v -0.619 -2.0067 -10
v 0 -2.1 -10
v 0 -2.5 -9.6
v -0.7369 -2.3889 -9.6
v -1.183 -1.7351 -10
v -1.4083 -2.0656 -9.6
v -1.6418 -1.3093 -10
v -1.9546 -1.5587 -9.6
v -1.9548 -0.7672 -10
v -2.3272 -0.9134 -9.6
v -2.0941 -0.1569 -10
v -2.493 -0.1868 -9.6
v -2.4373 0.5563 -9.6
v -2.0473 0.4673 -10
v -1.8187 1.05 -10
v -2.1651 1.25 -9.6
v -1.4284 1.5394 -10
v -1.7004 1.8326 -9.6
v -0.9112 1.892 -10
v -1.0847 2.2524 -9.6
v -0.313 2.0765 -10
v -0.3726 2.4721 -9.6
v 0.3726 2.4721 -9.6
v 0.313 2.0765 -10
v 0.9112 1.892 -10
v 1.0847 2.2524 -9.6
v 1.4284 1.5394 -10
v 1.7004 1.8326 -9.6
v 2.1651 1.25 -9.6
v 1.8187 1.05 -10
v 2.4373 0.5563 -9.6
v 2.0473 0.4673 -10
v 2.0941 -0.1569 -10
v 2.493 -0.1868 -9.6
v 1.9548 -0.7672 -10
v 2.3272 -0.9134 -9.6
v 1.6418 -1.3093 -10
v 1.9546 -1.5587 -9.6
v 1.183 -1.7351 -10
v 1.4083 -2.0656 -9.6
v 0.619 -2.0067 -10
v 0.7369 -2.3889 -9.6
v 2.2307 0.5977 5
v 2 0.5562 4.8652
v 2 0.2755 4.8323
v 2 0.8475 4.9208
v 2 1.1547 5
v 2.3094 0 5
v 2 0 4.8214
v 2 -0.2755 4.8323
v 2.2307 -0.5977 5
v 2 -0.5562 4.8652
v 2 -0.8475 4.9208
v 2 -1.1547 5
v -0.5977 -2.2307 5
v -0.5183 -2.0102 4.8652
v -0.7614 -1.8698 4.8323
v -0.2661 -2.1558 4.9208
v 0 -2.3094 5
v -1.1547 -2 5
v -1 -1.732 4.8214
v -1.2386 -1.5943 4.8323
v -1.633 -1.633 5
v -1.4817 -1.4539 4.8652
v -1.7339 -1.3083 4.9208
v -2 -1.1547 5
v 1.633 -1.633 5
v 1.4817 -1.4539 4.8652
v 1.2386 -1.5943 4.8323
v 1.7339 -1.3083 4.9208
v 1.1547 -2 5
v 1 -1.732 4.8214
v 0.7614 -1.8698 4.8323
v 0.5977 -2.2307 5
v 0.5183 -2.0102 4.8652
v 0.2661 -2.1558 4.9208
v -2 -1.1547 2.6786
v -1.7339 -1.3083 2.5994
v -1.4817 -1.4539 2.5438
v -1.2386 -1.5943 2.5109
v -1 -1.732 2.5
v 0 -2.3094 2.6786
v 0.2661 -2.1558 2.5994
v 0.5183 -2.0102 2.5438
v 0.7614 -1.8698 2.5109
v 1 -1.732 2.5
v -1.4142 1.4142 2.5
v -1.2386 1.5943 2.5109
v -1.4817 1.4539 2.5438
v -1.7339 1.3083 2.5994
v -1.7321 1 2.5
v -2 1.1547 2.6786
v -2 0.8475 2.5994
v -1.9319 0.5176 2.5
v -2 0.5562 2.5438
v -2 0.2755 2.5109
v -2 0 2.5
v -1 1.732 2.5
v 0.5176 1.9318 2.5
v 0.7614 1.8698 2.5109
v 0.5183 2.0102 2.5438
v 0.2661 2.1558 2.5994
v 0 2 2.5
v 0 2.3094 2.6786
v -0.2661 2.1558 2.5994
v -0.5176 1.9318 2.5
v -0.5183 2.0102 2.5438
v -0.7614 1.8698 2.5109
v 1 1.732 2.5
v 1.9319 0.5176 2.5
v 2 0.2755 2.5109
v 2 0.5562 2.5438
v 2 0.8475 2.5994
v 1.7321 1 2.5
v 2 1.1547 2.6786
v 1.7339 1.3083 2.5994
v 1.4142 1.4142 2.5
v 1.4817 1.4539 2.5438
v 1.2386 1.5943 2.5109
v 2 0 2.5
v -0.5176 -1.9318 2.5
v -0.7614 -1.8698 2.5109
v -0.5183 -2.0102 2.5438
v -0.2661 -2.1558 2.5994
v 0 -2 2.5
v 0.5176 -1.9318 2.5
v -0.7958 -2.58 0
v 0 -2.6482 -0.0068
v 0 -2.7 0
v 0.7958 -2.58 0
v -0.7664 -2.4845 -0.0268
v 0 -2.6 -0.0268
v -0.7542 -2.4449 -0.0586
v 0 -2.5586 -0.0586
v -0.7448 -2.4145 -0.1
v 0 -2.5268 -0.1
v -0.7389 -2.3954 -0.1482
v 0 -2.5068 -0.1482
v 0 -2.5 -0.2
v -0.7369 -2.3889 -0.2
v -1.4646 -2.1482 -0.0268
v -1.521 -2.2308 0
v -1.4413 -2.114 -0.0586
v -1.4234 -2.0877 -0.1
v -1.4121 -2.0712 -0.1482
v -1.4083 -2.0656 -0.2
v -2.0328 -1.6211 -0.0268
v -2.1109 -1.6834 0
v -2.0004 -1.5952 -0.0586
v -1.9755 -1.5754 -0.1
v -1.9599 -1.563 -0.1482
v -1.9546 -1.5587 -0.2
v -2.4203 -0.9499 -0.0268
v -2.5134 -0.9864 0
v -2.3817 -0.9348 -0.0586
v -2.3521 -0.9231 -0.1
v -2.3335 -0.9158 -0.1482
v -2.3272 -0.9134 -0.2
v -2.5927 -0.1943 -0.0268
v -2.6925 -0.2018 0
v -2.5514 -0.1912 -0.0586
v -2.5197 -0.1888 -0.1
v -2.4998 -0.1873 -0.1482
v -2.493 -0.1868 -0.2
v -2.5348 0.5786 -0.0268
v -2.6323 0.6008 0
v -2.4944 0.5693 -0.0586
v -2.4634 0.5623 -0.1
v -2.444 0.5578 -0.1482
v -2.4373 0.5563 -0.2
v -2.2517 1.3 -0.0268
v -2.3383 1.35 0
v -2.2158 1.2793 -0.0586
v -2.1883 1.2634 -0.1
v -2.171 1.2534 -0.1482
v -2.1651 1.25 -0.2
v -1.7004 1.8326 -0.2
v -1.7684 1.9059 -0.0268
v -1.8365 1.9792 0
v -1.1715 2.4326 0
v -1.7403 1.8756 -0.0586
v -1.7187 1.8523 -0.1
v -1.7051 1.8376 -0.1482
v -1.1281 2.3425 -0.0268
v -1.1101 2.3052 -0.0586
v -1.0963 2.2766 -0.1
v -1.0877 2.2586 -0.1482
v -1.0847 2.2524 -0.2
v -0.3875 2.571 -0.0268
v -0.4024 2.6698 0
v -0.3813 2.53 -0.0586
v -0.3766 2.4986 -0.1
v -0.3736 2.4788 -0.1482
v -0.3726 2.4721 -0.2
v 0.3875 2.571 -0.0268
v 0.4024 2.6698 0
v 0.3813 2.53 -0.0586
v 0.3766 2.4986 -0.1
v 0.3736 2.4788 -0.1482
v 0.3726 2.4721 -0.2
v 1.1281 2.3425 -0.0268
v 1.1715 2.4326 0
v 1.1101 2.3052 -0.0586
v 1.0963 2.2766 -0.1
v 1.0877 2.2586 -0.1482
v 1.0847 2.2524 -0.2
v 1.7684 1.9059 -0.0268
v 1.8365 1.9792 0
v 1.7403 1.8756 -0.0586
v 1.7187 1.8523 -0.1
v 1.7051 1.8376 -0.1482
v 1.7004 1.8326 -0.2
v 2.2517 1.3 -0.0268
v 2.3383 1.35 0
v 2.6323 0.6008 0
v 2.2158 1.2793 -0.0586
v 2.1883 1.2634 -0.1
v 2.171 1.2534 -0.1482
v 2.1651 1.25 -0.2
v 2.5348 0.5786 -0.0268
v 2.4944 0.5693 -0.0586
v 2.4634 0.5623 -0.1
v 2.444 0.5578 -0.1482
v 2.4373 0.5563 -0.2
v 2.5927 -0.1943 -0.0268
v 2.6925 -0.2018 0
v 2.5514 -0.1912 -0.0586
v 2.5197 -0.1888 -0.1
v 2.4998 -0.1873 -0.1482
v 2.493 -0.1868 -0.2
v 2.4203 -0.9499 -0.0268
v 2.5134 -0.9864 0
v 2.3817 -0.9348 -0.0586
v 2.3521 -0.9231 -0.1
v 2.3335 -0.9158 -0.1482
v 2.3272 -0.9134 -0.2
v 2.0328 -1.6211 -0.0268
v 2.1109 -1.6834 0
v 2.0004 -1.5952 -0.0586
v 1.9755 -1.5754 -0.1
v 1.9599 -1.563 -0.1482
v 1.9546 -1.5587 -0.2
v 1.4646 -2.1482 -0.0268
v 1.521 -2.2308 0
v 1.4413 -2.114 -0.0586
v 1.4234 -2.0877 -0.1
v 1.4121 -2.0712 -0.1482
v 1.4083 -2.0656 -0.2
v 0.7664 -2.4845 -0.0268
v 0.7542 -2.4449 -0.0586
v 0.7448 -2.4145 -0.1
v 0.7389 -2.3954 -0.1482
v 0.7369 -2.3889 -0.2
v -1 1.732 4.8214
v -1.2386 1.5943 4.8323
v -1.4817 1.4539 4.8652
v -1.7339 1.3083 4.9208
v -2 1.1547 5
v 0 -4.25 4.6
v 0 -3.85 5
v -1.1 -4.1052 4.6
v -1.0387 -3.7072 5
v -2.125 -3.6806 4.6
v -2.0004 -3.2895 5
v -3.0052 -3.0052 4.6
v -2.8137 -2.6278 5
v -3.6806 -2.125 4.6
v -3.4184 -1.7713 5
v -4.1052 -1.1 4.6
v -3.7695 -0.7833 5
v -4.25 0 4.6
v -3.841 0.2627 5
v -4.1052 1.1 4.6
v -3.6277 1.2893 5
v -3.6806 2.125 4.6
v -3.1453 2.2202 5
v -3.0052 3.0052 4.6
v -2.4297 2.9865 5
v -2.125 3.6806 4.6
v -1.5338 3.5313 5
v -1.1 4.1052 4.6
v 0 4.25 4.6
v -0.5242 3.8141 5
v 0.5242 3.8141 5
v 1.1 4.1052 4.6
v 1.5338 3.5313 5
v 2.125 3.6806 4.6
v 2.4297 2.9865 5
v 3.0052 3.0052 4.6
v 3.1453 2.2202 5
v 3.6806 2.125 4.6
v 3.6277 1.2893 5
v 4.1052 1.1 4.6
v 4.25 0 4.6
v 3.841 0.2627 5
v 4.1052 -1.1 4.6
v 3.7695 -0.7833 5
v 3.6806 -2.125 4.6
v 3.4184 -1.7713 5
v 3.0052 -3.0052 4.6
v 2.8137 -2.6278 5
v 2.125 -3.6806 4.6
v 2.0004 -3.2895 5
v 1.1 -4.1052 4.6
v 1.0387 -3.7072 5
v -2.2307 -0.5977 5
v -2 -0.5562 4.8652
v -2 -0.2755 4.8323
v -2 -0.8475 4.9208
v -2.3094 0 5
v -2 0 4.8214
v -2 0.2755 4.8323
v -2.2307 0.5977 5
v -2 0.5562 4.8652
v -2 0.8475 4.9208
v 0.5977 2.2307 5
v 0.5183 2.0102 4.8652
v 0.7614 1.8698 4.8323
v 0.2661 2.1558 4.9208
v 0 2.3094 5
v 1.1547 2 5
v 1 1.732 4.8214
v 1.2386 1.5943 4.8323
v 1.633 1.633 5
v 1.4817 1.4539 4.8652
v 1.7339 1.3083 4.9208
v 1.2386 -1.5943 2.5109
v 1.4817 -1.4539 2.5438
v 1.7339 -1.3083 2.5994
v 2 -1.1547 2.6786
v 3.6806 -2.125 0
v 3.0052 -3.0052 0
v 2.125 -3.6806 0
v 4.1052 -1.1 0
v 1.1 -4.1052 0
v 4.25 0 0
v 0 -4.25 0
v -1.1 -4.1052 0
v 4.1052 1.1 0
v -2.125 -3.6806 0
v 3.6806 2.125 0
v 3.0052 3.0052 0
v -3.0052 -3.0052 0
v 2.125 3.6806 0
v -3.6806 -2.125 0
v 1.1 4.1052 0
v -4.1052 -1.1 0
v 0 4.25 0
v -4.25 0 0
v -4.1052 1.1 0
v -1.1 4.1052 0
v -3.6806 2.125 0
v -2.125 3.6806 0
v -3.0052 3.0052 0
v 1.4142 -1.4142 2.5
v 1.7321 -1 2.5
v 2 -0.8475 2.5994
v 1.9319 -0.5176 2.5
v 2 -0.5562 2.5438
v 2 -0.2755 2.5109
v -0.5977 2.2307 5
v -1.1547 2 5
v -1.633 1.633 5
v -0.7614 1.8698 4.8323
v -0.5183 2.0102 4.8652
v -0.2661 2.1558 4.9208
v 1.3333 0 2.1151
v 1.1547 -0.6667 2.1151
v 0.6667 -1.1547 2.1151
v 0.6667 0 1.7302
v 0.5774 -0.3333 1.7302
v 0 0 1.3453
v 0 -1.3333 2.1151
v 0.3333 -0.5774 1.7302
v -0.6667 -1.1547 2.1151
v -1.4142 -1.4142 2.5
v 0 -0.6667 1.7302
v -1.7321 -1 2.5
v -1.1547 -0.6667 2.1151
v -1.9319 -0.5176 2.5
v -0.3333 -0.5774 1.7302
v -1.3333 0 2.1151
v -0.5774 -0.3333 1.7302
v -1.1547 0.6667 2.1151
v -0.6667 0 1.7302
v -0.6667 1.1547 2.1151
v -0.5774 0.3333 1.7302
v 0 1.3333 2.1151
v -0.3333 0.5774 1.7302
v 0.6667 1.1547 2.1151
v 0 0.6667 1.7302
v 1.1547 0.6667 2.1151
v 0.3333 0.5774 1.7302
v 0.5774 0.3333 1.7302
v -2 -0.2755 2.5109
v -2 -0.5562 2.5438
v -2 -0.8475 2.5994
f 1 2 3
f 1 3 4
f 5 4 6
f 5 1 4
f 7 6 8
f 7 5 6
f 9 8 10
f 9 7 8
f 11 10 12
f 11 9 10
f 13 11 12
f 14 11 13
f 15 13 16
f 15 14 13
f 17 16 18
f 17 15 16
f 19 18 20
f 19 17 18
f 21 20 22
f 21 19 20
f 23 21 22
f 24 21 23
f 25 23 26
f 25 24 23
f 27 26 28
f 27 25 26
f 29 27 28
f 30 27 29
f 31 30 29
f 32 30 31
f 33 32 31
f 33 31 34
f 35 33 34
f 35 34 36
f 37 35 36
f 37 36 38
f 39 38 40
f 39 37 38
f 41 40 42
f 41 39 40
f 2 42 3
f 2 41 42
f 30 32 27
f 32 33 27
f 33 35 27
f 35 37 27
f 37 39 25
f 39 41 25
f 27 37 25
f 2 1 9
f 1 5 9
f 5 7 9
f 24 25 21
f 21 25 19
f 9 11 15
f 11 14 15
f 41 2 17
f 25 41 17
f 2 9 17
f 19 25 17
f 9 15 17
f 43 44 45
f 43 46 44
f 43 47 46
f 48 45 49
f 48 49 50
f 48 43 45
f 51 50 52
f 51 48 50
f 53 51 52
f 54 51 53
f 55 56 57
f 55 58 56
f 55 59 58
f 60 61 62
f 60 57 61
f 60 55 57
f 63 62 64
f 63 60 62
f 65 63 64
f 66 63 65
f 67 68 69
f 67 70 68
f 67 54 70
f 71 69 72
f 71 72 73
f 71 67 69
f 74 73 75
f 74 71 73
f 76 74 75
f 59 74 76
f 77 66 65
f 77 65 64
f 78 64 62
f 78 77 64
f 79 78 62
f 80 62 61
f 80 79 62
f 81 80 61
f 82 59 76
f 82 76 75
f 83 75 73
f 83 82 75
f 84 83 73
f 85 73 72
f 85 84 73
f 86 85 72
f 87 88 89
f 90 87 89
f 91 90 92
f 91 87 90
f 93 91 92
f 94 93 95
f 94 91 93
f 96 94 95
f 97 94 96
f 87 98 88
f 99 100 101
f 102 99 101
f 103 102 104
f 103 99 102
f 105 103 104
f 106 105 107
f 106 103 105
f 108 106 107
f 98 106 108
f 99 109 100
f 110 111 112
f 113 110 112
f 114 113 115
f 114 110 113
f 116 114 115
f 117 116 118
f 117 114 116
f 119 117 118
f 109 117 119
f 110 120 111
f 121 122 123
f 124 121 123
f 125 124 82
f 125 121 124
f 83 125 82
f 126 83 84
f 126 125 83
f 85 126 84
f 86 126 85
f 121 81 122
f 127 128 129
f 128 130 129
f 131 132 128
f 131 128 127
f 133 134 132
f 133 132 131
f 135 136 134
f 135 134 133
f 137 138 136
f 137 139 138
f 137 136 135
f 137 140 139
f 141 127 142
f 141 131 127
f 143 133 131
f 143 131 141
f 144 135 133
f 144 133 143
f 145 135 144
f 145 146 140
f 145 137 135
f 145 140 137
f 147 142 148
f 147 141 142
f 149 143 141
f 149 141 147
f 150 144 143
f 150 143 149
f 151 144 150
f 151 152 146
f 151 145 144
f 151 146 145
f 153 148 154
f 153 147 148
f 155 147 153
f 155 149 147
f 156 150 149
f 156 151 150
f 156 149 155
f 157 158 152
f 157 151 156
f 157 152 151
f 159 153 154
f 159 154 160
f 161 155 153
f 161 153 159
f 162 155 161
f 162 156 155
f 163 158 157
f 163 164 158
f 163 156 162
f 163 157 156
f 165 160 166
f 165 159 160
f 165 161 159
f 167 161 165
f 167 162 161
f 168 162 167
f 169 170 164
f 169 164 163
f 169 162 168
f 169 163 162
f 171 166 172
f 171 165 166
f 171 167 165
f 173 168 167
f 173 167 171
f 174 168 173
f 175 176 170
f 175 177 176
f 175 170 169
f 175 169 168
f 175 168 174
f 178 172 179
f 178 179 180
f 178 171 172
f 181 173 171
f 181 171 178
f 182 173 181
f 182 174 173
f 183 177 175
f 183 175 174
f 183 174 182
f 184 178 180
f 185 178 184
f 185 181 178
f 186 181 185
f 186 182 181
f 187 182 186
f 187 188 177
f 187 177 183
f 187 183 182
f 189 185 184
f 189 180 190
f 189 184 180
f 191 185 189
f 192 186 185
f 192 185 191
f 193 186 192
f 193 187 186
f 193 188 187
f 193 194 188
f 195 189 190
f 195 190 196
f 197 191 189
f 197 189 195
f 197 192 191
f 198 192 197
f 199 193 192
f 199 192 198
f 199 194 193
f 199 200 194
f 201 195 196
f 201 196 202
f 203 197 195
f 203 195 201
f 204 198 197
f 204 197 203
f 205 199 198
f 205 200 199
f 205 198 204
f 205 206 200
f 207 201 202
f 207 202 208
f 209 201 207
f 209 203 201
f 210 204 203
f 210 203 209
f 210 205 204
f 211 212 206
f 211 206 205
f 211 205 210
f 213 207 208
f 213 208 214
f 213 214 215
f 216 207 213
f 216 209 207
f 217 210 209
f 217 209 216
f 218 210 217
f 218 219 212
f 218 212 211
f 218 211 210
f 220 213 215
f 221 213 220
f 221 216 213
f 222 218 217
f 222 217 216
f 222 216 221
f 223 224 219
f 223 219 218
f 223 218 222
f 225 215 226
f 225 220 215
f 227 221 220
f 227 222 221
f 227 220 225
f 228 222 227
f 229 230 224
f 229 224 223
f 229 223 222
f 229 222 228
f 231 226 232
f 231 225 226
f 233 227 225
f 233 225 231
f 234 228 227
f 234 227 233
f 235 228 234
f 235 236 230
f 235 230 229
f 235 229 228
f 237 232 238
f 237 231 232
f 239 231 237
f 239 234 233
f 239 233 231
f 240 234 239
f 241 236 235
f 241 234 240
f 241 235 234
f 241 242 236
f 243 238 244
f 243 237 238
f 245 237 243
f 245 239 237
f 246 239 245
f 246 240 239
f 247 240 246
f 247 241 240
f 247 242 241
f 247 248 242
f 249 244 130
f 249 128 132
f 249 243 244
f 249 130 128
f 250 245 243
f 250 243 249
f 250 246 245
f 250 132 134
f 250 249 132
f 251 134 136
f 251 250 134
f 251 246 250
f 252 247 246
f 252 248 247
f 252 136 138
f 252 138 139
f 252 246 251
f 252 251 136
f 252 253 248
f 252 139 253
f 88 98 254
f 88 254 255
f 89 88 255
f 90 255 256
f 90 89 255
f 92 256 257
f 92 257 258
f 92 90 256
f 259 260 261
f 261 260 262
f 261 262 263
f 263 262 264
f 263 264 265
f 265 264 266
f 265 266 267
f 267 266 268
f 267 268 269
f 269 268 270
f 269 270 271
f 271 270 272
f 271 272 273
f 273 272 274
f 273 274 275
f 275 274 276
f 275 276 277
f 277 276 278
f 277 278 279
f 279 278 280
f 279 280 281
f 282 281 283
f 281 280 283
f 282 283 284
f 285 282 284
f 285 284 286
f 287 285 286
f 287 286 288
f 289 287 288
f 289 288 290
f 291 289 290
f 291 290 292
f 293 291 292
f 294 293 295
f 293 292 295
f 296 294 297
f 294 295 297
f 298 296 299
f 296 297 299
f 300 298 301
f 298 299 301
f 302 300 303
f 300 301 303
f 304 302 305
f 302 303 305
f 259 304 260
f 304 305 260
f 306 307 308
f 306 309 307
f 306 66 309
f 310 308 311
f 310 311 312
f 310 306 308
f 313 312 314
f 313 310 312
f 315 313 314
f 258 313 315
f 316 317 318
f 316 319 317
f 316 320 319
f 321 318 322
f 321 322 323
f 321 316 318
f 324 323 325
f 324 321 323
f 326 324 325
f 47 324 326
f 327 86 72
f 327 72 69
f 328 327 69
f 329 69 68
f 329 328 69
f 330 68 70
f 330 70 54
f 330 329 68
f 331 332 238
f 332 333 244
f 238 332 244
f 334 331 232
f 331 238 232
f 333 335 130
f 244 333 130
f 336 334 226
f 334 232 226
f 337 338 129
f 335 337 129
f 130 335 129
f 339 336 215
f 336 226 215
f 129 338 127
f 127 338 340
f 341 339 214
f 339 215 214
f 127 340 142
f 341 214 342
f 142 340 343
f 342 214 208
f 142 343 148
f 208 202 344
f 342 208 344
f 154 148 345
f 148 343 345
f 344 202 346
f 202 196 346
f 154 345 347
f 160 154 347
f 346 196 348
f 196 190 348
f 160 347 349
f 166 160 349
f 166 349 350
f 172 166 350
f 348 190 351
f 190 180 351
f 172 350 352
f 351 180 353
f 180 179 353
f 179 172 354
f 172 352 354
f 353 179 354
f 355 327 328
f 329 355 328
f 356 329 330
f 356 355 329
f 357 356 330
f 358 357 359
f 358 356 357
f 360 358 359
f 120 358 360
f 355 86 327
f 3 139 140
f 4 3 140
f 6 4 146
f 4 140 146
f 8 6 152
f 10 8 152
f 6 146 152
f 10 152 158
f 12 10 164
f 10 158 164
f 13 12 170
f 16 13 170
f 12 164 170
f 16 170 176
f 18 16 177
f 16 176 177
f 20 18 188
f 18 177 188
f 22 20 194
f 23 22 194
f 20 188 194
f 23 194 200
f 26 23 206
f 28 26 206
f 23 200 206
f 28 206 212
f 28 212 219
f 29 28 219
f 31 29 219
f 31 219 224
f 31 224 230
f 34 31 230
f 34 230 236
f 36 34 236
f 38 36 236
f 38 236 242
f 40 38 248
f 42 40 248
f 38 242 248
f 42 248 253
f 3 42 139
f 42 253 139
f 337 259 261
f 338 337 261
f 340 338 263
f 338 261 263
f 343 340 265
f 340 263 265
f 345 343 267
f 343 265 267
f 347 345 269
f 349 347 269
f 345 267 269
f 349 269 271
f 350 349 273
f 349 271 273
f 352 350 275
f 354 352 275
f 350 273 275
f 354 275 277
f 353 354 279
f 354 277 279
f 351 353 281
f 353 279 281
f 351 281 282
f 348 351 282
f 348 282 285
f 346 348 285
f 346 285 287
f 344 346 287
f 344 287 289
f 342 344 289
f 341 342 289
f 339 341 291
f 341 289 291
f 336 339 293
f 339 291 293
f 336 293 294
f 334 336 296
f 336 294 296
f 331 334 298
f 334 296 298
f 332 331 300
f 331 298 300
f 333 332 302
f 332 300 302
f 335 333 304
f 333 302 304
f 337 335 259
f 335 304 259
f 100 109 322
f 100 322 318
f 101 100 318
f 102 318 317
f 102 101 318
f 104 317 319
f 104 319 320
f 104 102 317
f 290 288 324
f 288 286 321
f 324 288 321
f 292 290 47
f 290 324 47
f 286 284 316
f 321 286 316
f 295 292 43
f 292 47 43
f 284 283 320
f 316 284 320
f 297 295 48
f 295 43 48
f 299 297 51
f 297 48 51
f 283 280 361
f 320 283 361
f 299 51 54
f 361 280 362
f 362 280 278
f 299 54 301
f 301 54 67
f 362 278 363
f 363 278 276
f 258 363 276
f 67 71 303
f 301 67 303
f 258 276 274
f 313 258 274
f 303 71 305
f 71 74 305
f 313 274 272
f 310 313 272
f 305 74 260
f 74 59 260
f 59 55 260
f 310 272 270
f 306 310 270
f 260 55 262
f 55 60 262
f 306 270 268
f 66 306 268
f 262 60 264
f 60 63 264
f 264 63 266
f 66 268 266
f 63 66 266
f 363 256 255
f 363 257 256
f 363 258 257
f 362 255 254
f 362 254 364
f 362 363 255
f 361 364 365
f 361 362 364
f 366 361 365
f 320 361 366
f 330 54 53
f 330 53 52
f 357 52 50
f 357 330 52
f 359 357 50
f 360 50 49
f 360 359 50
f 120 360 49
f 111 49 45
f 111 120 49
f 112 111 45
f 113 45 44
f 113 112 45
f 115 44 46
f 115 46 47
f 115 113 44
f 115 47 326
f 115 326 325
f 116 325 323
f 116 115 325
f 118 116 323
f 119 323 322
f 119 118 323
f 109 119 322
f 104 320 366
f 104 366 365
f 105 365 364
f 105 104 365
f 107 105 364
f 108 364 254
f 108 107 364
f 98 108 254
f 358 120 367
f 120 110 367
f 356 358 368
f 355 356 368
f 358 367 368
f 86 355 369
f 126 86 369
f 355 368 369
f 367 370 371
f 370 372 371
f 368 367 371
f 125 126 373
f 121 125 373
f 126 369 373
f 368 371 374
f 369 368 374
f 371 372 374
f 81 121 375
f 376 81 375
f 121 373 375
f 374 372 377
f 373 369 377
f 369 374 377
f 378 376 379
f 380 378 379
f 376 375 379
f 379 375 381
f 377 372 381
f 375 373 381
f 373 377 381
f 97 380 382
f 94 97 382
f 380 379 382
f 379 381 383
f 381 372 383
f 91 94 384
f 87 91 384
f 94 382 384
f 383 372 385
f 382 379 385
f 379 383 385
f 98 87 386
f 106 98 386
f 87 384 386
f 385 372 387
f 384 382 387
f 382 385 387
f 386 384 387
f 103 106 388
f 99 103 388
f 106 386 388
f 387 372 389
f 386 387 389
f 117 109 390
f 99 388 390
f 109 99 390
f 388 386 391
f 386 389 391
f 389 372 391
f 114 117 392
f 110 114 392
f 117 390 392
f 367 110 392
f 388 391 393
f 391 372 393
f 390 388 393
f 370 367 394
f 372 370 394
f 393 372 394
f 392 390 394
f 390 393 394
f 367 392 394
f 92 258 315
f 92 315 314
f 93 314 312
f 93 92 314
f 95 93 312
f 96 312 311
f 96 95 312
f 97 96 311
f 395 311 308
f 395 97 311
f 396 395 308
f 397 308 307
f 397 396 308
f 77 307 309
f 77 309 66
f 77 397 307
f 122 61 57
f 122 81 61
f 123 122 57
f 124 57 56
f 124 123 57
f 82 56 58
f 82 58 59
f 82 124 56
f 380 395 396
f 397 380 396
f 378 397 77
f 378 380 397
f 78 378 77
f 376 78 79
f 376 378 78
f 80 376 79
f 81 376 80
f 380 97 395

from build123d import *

# Parameters (mm, degrees)
CHAMFER1_SIZE      = 0.4
CUT_EXTRUDE1_REACH = 18.159
FILLET2_R          = 0.2


with BuildPart() as part:
    # Sketch1 → Revolve1 (revolve)
    with BuildSketch(Plane(origin=(0, 0, 0), x_dir=(0, 0, -1), z_dir=(1, 0, 0))):
        Polygon((0, 4.25), (-5, 4.25), (-5, 0), (10, 0), (10, 2.5), (0, 2.5), align=None)
    revolve(axis=Axis((0, 0, 5), (0, 0, -1)))

    # Sketch7 → Cut-Revolve2 (revolve, cut)
    with BuildSketch(Plane(origin=(0, 0, 0), x_dir=(0, 0, -1), z_dir=(1, 0, 0))):
        Polygon((-5, 0), (-5, 2), (-2.5, 2), (-1.345299462, 0), align=None)
    revolve(axis=Axis((0, 0, 5), (0, 0, -1)), mode=Mode.SUBTRACT)

    # Chamfer1
    chamfer1_edges = [part.edges().sort_by_distance(p)[0] for p in [
        (0, -2.5, -10),
        (0, -4.25, 5),
    ]]
    chamfer(chamfer1_edges, length=CHAMFER1_SIZE)

    # Cut-Extrude1: up to this cone (the profile starts inside it)
    cut_extrude1_end = Plane(origin=(0, 0, 5), z_dir=(0, 0, 1)).offset(-3.654699538) * Cone(1.732e-06, 49.612564652, 28.643826557, align=(Align.CENTER, Align.CENTER, Align.MIN), mode=Mode.PRIVATE)
    # Sketch8 → Cut-Extrude1 (cut, up to the surface)
    with BuildSketch(Plane.XY.offset(5), mode=Mode.PRIVATE) as cut_extrude1_sk1:
        Polygon((0, 2.309401077), (-2, 1.154700538), (-2, -1.154700538), (0, -2.309401077), (2, -1.154700538), (2, 1.154700538), align=None)
    cut_extrude1_tool1 = extrude(cut_extrude1_sk1.sketch, amount=-CUT_EXTRUDE1_REACH, mode=Mode.PRIVATE) & cut_extrude1_end
    add(cut_extrude1_tool1.solids().sort_by_distance((0, 0, 5))[0], mode=Mode.SUBTRACT)

    # Sketch9 → Cut-Revolve3 (revolve, cut)
    with BuildSketch(Plane(origin=(0, 0, 0), x_dir=(0, 0, -1), z_dir=(1, 0, 0))):
        Polygon((-5.5, 3.175426481), (-5.5, 2), (-4.821367205, 2), align=None)
    revolve(axis=Axis((0, 0, 5), (0, 0, -1)), mode=Mode.SUBTRACT)

    # Fillet2
    fillet2_edges = [part.edges().sort_by_distance(p)[0] for p in [
        (0, -2.5, 0),
    ]]
    fillet(fillet2_edges, radius=FILLET2_R)


solid = part.part
